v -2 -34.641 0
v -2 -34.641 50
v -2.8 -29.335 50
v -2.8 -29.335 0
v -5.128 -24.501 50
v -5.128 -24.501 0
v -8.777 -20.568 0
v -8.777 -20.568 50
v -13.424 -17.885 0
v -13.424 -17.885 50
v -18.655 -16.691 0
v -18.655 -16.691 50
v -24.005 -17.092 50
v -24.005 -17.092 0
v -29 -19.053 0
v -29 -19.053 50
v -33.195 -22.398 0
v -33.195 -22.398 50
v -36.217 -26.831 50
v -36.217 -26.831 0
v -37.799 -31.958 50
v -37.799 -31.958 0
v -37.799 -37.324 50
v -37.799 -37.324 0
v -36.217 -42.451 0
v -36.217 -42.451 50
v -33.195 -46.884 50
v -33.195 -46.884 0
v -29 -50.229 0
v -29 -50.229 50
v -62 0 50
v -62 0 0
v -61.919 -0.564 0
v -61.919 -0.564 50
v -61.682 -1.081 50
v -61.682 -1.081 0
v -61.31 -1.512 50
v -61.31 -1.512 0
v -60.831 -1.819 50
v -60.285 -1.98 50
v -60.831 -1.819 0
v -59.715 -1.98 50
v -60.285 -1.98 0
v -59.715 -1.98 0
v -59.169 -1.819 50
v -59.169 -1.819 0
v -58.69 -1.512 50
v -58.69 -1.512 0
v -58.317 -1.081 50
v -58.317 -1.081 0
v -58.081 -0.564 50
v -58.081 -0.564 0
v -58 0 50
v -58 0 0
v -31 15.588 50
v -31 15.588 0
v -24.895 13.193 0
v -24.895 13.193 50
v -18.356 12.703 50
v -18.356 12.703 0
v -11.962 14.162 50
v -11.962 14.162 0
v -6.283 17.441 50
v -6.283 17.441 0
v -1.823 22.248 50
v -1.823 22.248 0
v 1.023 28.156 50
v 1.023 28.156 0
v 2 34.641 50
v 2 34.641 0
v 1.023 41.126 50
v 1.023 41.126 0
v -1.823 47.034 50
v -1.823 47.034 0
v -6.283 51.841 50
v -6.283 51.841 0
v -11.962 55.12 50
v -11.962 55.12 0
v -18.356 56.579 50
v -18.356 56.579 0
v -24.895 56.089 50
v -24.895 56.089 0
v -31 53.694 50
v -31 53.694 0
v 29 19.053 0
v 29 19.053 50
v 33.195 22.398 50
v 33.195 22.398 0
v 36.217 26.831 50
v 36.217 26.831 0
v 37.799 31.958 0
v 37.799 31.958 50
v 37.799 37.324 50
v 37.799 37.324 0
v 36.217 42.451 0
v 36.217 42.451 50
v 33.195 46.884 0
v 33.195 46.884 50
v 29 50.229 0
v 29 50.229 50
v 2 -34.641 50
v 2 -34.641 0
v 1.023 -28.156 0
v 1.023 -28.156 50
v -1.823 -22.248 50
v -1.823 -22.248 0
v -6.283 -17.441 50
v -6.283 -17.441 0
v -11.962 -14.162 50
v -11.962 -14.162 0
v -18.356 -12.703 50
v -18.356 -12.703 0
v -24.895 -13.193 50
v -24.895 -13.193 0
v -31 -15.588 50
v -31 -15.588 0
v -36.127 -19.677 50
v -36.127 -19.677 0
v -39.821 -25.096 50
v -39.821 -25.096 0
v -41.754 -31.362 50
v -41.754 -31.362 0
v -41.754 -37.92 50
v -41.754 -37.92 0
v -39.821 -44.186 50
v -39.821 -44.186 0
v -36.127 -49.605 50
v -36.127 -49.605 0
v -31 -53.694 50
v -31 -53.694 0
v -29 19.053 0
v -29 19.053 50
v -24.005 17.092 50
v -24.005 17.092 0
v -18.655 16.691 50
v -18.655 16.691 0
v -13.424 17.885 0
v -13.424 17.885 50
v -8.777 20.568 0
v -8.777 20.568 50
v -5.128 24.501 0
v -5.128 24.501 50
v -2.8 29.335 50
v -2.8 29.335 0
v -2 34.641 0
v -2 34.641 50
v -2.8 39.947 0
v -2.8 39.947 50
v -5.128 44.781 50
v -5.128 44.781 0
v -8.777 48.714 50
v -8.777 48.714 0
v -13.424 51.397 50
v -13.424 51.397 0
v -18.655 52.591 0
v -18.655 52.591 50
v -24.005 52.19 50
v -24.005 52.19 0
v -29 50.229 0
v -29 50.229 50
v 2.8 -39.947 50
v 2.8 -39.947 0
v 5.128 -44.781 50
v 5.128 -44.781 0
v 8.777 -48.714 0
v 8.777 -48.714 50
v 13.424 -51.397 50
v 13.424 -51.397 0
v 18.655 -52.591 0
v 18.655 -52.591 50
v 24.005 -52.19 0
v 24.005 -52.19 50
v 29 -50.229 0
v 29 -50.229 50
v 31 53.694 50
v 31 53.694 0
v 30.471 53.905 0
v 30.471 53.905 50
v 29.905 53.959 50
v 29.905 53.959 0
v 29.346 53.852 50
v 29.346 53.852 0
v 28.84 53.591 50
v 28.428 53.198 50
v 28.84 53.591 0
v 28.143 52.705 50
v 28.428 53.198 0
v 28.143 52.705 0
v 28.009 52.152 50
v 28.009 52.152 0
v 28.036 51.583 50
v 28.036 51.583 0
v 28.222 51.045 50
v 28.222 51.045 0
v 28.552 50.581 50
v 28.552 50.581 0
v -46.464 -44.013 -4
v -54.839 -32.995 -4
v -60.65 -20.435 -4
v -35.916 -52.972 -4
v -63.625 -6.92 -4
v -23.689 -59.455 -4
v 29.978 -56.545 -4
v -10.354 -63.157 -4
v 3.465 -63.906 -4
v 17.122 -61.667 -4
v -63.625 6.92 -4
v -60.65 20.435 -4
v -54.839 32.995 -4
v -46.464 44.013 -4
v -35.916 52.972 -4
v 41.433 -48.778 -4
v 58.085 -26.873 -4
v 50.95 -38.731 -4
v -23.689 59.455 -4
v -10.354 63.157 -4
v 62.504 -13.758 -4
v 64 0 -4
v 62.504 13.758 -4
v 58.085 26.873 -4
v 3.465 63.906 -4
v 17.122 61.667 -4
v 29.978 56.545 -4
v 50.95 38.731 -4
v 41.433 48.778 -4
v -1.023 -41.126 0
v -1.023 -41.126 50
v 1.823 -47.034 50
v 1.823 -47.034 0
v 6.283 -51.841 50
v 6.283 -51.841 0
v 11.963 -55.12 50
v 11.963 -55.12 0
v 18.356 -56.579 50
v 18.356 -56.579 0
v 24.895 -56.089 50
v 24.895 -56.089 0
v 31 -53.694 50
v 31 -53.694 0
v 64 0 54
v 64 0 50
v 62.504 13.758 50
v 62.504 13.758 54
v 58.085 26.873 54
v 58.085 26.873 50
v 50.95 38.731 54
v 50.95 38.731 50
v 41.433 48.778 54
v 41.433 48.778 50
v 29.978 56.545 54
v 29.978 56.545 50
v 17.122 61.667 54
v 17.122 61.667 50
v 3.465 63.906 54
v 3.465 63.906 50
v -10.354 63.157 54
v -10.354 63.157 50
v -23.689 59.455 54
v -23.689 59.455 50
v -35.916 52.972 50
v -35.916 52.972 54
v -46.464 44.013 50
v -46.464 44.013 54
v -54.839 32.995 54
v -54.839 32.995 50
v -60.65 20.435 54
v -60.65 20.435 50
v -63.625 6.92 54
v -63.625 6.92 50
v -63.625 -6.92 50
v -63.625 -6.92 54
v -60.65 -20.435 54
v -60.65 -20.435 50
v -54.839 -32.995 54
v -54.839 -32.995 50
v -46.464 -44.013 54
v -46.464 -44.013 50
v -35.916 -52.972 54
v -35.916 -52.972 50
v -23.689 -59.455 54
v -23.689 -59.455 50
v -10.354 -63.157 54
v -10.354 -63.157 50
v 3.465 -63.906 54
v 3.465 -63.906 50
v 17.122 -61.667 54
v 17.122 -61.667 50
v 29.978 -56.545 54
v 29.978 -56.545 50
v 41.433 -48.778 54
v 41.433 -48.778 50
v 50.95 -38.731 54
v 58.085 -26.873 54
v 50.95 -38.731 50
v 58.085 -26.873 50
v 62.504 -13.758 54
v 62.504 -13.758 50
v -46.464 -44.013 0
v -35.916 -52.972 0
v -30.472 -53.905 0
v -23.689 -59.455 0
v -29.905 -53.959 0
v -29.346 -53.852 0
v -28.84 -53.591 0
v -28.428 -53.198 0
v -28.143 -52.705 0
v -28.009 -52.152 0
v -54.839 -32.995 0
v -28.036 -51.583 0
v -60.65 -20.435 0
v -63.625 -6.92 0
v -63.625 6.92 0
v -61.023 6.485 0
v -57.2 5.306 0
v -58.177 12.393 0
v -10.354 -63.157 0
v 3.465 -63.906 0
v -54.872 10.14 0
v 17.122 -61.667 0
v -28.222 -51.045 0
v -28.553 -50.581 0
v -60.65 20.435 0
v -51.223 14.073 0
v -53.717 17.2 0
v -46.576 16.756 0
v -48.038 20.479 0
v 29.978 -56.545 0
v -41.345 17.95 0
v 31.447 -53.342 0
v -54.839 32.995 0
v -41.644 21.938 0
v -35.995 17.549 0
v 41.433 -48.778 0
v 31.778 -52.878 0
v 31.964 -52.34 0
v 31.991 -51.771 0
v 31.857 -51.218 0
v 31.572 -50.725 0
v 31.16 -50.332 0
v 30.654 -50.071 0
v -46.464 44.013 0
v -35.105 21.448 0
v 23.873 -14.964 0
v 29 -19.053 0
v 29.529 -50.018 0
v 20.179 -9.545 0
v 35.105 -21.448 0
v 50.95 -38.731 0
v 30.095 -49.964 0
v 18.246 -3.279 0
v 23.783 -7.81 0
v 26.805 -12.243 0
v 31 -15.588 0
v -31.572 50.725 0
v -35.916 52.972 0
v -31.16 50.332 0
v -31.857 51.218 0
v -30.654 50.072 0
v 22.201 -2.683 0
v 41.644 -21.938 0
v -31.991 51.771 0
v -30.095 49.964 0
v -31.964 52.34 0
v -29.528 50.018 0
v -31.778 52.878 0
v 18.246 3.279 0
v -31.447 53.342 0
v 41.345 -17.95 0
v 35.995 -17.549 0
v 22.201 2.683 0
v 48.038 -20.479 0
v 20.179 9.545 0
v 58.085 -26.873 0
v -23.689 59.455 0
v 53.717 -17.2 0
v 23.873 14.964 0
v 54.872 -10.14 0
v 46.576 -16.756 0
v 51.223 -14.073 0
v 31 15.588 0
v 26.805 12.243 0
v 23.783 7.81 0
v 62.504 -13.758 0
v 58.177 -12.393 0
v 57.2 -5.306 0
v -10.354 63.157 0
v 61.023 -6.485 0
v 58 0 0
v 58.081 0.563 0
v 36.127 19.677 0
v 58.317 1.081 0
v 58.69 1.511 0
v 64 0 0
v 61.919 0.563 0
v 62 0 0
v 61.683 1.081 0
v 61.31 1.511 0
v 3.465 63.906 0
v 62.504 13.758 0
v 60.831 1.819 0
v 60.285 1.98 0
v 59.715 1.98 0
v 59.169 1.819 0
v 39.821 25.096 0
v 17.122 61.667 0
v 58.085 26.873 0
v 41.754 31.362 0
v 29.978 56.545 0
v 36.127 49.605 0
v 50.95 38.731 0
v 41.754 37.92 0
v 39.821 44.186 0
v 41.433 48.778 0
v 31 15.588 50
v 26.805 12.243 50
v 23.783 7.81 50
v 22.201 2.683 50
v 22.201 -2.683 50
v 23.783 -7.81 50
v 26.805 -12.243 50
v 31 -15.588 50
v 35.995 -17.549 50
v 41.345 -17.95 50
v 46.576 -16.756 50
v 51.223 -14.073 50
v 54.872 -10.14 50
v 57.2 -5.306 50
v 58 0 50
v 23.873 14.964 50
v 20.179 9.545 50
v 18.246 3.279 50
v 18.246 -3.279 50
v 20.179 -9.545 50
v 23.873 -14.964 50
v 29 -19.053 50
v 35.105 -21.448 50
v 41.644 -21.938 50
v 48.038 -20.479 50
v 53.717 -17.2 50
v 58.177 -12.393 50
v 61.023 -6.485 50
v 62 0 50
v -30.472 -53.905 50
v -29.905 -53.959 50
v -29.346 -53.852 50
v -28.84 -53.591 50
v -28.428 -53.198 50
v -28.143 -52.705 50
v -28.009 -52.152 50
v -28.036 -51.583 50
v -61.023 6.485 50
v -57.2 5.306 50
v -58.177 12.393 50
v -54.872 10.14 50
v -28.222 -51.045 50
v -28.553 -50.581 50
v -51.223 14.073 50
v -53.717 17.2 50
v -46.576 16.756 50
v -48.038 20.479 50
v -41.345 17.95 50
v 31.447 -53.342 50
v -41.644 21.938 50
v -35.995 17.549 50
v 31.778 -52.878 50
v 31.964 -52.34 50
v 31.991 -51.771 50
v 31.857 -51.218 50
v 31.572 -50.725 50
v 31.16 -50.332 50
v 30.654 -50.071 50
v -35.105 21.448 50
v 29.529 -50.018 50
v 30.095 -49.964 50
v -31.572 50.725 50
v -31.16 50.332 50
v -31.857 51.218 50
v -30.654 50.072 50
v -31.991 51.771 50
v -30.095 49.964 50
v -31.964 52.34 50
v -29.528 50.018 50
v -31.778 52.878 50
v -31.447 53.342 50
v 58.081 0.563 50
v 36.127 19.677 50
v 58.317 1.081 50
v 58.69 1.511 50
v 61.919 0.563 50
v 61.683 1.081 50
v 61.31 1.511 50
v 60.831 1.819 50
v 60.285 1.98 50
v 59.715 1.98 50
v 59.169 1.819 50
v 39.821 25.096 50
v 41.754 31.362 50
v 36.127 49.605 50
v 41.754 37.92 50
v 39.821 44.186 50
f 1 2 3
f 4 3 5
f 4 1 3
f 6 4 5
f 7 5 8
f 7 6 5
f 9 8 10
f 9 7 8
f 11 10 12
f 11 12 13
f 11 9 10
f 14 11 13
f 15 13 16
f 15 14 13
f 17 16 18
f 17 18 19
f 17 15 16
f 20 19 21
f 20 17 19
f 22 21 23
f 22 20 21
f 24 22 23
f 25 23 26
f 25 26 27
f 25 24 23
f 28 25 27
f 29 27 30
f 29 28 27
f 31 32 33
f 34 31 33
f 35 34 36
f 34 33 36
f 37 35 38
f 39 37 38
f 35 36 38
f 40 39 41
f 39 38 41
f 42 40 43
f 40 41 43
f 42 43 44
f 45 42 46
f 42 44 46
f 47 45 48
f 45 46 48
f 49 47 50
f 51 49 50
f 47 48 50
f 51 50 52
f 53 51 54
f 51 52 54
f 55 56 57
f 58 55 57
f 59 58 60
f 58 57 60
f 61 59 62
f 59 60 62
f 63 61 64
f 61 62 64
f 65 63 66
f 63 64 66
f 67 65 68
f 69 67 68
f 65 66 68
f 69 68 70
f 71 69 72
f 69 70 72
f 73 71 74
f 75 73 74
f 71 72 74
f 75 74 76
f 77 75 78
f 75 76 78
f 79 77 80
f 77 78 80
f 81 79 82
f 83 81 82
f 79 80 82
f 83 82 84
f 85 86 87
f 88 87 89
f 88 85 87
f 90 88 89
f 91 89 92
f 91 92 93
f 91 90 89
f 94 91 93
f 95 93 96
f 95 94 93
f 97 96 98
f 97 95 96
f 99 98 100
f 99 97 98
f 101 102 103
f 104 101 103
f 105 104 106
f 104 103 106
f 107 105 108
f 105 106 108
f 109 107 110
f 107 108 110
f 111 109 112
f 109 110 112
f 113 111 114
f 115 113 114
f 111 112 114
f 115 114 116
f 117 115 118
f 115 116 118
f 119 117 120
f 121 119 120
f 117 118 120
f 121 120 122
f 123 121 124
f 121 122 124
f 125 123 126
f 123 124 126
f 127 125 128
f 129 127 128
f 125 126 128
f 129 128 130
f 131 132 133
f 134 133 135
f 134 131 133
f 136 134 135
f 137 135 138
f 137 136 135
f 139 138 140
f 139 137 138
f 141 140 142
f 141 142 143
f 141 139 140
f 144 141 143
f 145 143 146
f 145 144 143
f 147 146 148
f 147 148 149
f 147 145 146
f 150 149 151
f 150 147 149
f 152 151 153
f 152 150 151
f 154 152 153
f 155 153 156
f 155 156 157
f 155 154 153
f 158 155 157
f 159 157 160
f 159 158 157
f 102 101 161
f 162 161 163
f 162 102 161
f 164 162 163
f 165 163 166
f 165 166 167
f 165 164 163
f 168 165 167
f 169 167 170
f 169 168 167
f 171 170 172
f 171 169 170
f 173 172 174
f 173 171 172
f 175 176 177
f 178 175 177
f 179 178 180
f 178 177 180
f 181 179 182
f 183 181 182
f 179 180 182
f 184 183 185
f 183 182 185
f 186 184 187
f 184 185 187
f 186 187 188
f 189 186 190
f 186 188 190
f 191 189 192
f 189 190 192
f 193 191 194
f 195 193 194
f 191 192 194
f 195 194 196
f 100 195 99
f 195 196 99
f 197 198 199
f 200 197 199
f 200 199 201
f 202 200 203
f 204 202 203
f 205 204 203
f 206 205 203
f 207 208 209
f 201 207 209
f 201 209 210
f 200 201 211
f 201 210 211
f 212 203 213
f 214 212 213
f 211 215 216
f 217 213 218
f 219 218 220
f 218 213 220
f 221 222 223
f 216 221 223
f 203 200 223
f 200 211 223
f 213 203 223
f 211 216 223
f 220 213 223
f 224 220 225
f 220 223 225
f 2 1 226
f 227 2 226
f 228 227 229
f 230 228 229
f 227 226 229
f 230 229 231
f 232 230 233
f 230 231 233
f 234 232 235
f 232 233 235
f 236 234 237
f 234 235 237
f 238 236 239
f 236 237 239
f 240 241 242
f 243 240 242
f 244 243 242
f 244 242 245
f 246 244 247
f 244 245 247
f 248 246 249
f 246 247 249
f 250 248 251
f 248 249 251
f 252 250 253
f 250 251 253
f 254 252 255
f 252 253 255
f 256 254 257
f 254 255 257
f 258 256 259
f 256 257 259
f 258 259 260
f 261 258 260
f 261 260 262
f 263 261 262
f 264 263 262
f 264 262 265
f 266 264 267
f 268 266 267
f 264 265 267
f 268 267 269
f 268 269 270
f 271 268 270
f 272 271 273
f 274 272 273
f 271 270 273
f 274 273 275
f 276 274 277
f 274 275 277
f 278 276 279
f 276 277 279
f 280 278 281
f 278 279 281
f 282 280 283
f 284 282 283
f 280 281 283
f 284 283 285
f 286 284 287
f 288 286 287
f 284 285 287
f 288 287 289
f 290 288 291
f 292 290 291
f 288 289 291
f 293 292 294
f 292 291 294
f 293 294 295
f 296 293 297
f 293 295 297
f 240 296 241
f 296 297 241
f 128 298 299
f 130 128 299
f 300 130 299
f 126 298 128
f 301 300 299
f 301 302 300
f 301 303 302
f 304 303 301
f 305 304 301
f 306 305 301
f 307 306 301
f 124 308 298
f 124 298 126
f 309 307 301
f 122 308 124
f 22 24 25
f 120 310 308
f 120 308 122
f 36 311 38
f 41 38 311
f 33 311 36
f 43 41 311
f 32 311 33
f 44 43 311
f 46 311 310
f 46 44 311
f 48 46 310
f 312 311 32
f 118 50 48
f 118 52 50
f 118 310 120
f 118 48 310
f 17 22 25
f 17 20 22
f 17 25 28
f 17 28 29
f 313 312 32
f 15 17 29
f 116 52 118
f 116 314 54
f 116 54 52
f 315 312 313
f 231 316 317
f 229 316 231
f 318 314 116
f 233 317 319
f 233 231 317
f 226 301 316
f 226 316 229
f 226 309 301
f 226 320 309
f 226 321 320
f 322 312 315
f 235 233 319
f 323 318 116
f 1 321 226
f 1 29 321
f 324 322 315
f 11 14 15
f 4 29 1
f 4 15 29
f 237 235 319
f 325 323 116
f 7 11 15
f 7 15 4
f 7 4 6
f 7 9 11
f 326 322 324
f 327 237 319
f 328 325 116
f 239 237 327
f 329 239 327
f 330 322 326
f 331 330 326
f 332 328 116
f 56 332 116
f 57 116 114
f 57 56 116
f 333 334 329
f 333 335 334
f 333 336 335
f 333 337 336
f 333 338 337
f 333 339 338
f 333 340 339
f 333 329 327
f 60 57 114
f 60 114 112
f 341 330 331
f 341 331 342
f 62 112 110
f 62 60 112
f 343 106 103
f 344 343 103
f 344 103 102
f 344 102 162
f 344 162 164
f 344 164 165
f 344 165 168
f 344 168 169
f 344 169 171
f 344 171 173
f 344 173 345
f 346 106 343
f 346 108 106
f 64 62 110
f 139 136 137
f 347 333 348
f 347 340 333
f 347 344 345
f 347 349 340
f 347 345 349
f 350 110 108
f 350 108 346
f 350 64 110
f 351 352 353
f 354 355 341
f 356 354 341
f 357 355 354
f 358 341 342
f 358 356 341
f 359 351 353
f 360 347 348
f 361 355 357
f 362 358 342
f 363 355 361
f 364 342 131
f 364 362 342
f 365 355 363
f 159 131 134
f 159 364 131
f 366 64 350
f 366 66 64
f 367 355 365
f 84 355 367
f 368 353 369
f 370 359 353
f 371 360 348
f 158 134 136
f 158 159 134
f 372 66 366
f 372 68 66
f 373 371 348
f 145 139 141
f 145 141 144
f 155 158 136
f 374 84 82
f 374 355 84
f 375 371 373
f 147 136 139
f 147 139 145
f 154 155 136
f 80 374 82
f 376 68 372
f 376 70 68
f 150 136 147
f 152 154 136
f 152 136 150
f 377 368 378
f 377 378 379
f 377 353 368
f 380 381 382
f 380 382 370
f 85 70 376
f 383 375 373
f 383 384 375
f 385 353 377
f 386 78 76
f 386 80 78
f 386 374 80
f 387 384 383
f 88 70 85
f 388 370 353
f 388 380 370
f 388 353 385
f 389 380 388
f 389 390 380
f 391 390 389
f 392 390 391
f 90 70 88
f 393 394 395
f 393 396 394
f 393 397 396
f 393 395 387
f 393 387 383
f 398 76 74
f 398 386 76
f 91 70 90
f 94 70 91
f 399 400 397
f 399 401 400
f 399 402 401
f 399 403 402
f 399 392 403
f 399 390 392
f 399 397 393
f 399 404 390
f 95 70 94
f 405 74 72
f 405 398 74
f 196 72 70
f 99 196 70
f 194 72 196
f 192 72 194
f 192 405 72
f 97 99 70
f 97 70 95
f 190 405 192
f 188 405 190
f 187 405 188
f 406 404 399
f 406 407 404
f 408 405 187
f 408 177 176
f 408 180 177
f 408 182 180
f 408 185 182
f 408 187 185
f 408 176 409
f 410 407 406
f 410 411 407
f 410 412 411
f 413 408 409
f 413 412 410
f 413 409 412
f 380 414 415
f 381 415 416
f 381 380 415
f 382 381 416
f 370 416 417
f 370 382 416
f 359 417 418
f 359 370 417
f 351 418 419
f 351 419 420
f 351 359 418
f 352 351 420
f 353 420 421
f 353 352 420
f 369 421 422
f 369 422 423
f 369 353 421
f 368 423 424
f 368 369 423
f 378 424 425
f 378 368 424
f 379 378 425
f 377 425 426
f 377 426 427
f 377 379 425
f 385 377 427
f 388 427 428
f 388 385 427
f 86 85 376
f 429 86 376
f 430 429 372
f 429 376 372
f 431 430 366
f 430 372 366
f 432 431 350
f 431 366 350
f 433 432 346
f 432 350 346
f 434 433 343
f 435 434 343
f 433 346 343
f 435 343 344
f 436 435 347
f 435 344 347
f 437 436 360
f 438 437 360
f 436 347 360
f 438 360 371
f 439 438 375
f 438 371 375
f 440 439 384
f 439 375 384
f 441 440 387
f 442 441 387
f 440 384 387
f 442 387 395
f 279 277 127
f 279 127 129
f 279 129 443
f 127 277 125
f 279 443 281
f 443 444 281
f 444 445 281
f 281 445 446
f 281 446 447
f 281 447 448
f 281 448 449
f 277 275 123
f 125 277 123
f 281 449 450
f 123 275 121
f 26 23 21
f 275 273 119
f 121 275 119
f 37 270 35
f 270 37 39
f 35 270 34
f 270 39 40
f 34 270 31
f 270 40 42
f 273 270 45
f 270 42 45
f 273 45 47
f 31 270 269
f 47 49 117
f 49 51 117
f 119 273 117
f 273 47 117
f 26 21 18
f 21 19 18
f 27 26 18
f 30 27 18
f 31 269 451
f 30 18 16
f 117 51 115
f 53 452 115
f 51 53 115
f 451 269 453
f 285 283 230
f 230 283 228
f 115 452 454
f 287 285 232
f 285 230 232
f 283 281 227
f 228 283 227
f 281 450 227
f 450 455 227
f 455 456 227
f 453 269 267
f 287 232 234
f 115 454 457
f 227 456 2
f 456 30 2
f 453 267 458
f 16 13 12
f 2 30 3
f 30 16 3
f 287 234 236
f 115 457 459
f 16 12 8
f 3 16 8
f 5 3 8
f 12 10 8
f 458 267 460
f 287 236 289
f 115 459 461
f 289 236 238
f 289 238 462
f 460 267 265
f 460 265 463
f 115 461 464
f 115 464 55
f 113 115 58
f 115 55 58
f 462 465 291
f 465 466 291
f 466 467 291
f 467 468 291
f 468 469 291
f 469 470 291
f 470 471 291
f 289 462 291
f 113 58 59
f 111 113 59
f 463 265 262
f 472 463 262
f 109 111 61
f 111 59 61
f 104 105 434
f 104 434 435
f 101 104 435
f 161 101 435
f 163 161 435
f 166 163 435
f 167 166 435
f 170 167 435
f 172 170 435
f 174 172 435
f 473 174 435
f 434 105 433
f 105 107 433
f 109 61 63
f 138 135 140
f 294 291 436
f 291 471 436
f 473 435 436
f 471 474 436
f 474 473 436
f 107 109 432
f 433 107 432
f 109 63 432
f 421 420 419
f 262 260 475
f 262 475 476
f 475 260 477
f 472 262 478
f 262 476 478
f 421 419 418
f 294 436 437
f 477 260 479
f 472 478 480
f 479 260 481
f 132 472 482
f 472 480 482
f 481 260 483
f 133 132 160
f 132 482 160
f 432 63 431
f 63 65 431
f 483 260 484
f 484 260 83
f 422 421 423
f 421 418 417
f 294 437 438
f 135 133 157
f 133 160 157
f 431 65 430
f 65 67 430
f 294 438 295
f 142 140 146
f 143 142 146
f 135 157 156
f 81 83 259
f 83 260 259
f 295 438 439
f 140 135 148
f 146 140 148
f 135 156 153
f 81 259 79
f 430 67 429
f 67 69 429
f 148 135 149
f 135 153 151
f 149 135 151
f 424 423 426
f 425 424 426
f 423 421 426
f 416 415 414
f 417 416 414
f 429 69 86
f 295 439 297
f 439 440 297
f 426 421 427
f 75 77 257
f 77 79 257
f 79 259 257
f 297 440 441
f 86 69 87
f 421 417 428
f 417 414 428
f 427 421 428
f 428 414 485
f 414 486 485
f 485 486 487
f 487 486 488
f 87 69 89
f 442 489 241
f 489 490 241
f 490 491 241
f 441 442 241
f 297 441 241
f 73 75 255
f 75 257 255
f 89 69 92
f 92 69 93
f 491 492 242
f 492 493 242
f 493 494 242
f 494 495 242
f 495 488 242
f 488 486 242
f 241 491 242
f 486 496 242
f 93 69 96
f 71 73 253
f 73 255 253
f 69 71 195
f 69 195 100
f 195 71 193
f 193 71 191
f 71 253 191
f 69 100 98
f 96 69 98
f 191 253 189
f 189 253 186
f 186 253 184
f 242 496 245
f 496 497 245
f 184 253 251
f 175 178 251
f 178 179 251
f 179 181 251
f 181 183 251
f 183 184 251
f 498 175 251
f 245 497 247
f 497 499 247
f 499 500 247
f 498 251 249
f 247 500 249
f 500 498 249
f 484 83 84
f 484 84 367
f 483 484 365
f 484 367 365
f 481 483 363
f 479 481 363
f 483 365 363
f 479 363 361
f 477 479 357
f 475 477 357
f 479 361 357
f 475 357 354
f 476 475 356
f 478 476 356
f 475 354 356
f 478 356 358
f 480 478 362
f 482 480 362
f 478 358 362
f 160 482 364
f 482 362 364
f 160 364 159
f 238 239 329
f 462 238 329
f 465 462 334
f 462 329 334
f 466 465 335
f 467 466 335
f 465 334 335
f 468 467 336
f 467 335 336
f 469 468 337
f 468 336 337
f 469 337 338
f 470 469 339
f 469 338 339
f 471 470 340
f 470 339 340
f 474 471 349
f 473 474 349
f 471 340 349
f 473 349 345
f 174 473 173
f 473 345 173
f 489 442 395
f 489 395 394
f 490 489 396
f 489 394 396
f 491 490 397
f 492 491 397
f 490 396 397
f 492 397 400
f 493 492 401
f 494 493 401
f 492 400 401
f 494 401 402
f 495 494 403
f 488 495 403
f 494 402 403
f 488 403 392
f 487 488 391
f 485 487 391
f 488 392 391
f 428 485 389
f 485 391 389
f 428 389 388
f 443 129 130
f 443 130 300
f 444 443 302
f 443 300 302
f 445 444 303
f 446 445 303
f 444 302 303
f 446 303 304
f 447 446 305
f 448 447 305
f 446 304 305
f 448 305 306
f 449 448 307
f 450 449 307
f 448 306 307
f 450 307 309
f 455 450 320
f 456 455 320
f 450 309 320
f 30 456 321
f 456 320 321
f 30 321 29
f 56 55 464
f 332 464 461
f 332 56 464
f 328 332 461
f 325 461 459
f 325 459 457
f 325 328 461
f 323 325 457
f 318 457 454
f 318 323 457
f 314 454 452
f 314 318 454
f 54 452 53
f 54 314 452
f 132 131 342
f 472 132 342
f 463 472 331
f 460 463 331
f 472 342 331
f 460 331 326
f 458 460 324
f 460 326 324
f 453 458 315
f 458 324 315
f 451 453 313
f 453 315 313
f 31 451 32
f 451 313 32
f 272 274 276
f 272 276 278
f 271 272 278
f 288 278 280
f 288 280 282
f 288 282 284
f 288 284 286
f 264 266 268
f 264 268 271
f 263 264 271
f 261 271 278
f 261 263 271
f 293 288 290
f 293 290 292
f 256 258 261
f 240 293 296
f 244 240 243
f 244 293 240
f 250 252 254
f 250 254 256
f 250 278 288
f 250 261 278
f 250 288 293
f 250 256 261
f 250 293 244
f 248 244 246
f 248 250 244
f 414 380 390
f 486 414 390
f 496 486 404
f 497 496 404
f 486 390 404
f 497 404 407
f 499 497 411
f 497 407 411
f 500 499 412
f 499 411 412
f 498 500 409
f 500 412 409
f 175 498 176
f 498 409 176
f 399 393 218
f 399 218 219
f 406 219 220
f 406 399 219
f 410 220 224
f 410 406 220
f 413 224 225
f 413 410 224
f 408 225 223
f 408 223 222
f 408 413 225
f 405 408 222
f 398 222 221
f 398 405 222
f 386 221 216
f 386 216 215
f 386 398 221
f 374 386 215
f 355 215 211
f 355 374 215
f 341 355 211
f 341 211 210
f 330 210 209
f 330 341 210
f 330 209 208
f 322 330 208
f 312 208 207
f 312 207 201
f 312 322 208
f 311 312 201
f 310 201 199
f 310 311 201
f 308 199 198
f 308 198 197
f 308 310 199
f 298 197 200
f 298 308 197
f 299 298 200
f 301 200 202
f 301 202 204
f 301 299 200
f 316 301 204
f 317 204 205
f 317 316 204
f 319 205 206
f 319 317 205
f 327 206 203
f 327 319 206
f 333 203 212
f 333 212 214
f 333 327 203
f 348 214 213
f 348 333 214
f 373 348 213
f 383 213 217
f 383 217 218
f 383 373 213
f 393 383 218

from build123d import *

# Parameters (mm, degrees)
SKETCH_R           = 64
PAD_DEPTH          = 4
PAD001_DEPTH       = 50
POLARPATTERN_COUNT = 3
SKETCH002_R        = 64
PAD002_DEPTH       = 4


with BuildPart() as part:
    # Sketch → Pad (new body)
    with BuildSketch(Plane.XY):
        Circle(SKETCH_R)
    extrude(amount=-PAD_DEPTH)

    # Sketch001 → Pad001 (join)
    with BuildSketch(Plane.XY):
        with BuildLine():
            ThreePointArc((29, 19.052559), (29, -19.052559), (62, 0))
            ThreePointArc((62, 0), (60, 2), (58, 0))
            ThreePointArc((31, 15.588457), (31, -15.588457), (58, 0))
            ThreePointArc((31, 15.588457), (41.999973, 34.641035), (30.99994, 53.693578))
            ThreePointArc((30.99994, 53.693578), (28.267891, 52.961523), (28.999946, 50.229473))
            ThreePointArc((29, 19.052559), (37.999973, 34.641032), (28.999946, 50.229473))
        make_face()
    pad001 = extrude(amount=PAD001_DEPTH)

    # PolarPattern: Pad001 ×3 about axis
    polarpattern_axis = Axis((0, 0, 0), (0, 0, 1))
    for i in range(1, POLARPATTERN_COUNT):
        add(pad001.rotate(polarpattern_axis, i * 360 / POLARPATTERN_COUNT))

    # Sketch002 → Pad002 (join)
    with BuildSketch(Plane.XY.offset(50)):
        Circle(SKETCH002_R)
    extrude(amount=PAD002_DEPTH)


solid = part.part
